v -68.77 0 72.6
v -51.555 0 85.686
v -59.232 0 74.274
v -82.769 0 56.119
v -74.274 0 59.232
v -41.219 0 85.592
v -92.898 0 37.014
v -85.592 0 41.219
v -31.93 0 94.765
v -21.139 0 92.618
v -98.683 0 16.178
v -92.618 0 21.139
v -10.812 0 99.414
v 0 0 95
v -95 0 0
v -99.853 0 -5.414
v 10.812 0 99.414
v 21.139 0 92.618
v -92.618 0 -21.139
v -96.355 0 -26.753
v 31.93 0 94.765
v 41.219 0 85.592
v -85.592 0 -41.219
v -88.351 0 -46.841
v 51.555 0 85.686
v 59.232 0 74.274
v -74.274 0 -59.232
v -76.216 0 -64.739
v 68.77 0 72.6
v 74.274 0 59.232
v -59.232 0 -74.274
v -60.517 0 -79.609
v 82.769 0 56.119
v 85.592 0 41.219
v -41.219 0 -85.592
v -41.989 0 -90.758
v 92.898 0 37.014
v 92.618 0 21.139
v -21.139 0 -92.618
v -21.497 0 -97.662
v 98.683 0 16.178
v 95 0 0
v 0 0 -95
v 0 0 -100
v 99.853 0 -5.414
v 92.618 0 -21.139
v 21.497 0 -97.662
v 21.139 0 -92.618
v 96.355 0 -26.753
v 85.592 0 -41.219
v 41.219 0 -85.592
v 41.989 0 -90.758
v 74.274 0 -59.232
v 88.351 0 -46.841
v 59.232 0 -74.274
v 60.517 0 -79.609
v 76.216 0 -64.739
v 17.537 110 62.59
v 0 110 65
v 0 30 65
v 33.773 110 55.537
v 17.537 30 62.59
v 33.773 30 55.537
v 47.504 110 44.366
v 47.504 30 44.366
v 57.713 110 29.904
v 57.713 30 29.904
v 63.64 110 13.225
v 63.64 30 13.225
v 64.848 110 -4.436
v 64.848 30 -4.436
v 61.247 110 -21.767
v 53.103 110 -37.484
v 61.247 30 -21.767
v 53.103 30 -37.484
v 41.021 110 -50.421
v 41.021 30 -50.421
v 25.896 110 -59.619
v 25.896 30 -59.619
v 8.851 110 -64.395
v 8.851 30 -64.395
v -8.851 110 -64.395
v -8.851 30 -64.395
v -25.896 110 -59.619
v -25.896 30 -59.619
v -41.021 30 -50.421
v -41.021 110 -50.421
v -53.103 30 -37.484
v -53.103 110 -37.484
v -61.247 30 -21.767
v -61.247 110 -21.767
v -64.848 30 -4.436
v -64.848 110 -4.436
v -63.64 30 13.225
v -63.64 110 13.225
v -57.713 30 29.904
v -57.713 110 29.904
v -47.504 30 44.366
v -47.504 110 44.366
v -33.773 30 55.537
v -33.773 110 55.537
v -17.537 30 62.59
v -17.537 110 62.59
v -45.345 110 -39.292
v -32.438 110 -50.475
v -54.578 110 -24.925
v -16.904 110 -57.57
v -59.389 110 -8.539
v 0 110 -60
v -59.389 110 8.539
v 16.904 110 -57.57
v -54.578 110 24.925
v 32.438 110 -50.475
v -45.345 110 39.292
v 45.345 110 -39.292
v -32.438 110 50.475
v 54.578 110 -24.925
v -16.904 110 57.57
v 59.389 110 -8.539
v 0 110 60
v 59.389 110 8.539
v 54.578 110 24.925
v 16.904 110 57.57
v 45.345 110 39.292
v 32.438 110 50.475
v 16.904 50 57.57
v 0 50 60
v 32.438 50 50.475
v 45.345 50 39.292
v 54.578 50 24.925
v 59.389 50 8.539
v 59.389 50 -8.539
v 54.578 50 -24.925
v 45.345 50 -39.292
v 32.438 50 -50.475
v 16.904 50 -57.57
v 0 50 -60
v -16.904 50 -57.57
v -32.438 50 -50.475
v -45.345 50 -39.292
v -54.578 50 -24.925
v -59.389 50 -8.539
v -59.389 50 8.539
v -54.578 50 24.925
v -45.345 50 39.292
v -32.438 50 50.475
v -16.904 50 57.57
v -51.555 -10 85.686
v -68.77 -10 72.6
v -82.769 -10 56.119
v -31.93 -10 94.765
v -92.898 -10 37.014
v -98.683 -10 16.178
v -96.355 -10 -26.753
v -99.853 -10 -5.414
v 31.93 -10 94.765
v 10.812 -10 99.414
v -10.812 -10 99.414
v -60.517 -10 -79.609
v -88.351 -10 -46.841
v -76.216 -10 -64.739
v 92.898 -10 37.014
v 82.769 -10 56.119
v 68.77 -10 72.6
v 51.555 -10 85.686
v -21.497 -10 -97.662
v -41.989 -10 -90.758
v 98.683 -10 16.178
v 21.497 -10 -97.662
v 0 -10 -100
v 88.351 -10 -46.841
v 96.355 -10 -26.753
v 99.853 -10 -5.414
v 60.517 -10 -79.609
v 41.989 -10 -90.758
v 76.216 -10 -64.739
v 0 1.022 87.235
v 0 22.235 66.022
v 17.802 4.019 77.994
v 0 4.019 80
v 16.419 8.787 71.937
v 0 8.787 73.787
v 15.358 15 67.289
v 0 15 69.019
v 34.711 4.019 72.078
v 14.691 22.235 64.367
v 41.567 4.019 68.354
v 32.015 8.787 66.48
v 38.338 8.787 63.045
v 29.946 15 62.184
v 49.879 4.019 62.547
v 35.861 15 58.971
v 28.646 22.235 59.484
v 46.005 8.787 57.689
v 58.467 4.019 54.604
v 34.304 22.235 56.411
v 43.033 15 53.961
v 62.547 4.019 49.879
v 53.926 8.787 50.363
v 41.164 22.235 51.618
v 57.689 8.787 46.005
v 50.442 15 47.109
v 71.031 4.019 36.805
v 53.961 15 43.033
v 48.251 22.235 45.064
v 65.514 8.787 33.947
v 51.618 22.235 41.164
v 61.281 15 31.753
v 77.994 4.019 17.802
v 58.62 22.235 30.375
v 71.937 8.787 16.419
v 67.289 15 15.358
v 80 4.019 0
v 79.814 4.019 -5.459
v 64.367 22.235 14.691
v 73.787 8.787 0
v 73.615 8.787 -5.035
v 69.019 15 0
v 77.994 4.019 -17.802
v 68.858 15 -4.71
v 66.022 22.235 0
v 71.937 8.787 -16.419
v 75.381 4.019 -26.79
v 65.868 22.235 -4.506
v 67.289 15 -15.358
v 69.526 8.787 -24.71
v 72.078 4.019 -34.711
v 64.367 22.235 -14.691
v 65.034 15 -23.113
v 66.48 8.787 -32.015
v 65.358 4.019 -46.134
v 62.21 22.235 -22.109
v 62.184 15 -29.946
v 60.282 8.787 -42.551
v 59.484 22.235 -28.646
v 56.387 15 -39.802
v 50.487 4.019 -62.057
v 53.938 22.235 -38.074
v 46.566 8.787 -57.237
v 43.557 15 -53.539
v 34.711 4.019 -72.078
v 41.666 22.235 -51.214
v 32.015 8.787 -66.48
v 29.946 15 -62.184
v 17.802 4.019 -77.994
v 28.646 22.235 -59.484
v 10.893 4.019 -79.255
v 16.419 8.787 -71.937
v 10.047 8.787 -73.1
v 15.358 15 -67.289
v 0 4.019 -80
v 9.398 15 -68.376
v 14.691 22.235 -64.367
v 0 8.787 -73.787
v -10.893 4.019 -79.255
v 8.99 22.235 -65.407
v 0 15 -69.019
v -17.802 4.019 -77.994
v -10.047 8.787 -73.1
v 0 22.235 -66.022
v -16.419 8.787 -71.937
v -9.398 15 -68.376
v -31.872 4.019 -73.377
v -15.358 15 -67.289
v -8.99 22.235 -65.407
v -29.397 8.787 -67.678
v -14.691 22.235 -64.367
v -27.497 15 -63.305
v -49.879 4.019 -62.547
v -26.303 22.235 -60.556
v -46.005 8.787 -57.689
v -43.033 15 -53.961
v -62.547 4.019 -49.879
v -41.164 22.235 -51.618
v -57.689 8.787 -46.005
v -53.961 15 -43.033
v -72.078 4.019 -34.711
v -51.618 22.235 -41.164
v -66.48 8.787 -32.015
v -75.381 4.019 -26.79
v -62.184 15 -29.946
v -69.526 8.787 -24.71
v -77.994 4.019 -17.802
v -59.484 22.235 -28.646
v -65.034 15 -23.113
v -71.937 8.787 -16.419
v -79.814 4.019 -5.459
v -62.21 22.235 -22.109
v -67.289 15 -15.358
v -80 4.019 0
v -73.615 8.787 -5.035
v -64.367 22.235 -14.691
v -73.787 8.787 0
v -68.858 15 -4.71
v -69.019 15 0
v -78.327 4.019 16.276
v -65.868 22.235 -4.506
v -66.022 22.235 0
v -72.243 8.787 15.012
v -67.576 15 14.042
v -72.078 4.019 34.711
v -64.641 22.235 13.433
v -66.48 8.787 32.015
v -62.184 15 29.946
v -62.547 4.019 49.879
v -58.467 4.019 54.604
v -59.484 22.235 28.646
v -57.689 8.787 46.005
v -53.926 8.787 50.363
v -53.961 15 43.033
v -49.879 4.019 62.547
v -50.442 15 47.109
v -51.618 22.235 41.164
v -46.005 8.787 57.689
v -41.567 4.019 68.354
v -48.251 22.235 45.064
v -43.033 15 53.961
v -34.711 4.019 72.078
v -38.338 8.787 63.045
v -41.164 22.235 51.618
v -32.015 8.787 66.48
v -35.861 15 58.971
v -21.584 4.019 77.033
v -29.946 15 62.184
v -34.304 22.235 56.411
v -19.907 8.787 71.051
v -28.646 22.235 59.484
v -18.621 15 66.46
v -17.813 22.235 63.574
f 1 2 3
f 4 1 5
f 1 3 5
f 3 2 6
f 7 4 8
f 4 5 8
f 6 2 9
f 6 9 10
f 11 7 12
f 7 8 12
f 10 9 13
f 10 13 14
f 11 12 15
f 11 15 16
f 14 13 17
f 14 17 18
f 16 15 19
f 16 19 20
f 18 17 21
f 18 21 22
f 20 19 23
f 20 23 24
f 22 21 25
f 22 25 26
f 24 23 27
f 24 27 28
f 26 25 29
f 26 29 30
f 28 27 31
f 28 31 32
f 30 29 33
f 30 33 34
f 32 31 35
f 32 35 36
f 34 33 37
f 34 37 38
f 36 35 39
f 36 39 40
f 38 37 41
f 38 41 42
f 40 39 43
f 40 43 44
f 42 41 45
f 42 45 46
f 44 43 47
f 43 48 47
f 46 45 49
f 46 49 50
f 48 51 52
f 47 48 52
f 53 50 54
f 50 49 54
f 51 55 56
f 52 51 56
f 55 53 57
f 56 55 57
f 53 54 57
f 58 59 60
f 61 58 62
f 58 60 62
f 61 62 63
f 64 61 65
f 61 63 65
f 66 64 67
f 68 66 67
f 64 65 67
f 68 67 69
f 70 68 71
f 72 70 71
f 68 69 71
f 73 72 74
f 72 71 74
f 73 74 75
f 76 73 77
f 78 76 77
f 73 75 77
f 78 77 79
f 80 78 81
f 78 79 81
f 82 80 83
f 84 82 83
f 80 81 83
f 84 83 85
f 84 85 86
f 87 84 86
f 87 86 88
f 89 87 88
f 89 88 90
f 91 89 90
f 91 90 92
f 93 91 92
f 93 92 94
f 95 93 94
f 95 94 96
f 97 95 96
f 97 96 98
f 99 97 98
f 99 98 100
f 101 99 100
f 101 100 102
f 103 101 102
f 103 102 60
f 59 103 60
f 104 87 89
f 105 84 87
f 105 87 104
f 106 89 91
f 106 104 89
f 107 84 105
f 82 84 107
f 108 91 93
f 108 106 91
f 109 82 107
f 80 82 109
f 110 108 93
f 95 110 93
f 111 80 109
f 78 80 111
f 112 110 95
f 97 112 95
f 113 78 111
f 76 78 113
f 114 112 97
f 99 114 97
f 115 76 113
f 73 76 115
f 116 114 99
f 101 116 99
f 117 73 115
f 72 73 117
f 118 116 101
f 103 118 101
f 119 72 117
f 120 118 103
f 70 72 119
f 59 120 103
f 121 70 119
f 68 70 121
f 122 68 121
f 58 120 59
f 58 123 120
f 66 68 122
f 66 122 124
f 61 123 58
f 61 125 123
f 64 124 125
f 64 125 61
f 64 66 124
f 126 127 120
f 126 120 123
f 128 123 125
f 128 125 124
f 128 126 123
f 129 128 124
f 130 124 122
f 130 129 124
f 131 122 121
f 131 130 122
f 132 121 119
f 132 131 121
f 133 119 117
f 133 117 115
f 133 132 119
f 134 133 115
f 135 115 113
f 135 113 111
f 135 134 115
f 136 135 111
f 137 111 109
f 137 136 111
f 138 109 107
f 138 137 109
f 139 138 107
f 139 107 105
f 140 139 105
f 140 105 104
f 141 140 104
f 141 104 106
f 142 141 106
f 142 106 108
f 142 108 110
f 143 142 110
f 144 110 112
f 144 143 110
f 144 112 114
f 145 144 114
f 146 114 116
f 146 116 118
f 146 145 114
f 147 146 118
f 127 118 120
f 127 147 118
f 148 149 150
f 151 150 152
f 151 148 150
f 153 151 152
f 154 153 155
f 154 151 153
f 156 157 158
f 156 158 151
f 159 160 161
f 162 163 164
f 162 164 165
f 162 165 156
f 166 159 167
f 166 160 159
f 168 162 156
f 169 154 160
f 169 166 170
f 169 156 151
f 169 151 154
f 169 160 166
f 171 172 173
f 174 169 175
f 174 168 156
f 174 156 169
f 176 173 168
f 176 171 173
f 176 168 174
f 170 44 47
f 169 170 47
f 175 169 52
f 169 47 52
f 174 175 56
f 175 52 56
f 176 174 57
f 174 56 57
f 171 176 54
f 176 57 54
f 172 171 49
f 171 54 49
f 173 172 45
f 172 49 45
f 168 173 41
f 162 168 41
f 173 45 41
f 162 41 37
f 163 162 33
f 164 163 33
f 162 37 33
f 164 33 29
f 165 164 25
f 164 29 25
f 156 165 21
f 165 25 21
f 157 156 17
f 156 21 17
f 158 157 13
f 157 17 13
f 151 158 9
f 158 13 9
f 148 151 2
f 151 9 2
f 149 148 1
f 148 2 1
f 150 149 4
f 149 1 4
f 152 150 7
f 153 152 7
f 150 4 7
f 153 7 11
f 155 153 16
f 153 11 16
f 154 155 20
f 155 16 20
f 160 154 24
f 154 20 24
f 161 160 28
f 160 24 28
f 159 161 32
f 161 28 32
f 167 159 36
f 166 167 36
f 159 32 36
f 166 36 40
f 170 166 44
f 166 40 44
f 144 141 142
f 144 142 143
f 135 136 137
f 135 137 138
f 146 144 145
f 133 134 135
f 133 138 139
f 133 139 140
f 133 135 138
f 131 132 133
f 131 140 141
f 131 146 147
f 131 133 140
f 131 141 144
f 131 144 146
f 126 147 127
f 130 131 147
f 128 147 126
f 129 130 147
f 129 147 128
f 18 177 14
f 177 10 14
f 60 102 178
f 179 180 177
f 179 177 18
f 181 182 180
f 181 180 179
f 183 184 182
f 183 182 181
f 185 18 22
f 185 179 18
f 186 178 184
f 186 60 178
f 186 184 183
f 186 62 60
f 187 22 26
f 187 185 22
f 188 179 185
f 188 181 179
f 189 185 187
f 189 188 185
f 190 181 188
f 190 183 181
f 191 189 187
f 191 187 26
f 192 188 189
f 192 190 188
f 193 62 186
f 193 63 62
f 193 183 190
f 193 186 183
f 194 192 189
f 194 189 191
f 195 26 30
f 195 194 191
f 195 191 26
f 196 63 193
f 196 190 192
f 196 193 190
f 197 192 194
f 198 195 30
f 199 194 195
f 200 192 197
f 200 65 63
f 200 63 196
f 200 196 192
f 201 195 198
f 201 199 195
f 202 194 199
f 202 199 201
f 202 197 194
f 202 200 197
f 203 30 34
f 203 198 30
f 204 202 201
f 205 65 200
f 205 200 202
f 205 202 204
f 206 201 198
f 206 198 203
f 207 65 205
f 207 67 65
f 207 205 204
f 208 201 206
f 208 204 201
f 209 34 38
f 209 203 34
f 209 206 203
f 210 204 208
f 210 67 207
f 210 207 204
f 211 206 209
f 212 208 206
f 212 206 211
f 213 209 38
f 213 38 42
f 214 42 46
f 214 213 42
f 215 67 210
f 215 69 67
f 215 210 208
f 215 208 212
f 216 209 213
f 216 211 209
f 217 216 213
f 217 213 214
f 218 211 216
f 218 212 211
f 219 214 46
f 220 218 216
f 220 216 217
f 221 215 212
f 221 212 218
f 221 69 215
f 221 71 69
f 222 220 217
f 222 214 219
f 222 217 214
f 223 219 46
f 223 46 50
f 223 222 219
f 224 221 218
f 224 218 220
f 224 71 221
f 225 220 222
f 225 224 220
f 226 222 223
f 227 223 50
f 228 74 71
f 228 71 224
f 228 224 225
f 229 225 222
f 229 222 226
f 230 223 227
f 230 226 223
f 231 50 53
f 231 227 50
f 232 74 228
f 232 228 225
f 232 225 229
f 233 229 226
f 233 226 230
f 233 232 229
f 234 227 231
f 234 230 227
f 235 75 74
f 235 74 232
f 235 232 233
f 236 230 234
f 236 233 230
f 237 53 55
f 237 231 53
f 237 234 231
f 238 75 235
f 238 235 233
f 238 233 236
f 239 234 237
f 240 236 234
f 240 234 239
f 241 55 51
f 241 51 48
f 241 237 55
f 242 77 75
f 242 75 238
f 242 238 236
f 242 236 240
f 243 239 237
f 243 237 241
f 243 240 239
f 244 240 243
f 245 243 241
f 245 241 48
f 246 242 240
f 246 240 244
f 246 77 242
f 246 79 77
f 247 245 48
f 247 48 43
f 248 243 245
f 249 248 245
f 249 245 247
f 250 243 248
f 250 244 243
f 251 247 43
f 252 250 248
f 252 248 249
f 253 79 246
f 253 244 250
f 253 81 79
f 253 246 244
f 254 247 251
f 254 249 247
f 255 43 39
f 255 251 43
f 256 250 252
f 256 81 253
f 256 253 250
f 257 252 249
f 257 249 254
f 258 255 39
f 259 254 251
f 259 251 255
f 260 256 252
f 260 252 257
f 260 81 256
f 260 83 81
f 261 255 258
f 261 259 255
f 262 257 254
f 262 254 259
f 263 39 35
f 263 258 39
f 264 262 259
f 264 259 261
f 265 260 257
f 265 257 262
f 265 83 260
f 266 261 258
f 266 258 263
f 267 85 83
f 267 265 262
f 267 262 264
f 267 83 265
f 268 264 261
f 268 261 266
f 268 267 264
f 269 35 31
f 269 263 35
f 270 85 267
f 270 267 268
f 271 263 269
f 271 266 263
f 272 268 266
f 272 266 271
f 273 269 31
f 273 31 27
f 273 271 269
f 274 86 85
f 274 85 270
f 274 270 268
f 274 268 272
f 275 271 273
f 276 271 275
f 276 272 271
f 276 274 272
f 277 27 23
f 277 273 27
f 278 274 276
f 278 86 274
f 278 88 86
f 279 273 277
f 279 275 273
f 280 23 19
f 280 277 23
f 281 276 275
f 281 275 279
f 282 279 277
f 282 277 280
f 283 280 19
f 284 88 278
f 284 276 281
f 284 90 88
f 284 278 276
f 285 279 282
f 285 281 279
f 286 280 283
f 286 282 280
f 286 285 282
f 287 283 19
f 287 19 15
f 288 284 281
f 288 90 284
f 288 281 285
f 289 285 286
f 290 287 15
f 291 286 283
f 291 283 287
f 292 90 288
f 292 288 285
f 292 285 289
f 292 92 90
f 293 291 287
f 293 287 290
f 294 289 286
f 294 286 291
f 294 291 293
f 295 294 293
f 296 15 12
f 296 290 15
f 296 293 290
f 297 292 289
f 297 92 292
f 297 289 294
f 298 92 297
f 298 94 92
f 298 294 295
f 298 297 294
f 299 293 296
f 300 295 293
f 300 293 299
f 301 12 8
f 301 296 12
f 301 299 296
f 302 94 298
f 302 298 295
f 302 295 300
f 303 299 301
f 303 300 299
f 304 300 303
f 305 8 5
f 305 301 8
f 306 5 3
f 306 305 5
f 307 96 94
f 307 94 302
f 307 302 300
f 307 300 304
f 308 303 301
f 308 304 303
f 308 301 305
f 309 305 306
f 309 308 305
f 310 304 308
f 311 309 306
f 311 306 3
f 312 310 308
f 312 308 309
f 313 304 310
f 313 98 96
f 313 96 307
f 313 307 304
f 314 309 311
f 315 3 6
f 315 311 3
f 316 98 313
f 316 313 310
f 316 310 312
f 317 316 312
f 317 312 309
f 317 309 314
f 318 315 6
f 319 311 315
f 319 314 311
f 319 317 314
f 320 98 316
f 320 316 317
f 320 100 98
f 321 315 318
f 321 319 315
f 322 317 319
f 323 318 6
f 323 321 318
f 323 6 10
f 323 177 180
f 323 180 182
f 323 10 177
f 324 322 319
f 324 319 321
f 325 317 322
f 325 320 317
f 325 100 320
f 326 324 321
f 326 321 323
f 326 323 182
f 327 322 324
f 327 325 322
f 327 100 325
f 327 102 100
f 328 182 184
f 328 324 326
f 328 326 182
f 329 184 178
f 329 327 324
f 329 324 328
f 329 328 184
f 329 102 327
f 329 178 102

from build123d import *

# Parameters (mm, degrees)
SKETCH_1_R      = 65
EXTRUDE_1_DEPTH = 50
SKETCH_2_R      = 65
SKETCH_2_R_2    = 60
EXTRUDE_2_DEPTH = 60
SKETCH_3_R      = 100
EXTRUDE_3_DEPTH = 10
FILLET_1_R      = 30


with BuildPart() as part:
    # 草图1 → 凸台-拉伸1 (new body)
    with BuildSketch(Plane(origin=(0, 0, 0), x_dir=(1, 0, 0), z_dir=(0, 1, 0))):
        with Locations(Location((0, 0, 0), (0, 0, 270))):
            Circle(SKETCH_1_R)
    extrude(amount=EXTRUDE_1_DEPTH)

    # 草图2 → 凸台-拉伸2 (add)
    with BuildSketch(Plane(origin=(0, 50, 0), x_dir=(1, 0, 0), z_dir=(0, 1, 0))):
        with Locations(Location((0, 0, 0), (0, 0, 270))):
            Circle(SKETCH_2_R)
        with Locations(Location((0, 0, 0), (0, 0, 270))):
            Circle(SKETCH_2_R_2, mode=Mode.SUBTRACT)
    extrude(amount=EXTRUDE_2_DEPTH)

    # 草图3 → 凸台-拉伸3 (add)
    with BuildSketch(Plane.XZ):
        with Locations(Location((0, 0, 0), (0, 0, 270))):
            Circle(SKETCH_3_R)
    extrude(amount=EXTRUDE_3_DEPTH)

    # 圆角1
    fillet_1_edges = [part.edges().sort_by_distance(p)[0] for p in [
        (0, 0, -65),
    ]]
    fillet(fillet_1_edges, radius=FILLET_1_R)


solid = part.part
